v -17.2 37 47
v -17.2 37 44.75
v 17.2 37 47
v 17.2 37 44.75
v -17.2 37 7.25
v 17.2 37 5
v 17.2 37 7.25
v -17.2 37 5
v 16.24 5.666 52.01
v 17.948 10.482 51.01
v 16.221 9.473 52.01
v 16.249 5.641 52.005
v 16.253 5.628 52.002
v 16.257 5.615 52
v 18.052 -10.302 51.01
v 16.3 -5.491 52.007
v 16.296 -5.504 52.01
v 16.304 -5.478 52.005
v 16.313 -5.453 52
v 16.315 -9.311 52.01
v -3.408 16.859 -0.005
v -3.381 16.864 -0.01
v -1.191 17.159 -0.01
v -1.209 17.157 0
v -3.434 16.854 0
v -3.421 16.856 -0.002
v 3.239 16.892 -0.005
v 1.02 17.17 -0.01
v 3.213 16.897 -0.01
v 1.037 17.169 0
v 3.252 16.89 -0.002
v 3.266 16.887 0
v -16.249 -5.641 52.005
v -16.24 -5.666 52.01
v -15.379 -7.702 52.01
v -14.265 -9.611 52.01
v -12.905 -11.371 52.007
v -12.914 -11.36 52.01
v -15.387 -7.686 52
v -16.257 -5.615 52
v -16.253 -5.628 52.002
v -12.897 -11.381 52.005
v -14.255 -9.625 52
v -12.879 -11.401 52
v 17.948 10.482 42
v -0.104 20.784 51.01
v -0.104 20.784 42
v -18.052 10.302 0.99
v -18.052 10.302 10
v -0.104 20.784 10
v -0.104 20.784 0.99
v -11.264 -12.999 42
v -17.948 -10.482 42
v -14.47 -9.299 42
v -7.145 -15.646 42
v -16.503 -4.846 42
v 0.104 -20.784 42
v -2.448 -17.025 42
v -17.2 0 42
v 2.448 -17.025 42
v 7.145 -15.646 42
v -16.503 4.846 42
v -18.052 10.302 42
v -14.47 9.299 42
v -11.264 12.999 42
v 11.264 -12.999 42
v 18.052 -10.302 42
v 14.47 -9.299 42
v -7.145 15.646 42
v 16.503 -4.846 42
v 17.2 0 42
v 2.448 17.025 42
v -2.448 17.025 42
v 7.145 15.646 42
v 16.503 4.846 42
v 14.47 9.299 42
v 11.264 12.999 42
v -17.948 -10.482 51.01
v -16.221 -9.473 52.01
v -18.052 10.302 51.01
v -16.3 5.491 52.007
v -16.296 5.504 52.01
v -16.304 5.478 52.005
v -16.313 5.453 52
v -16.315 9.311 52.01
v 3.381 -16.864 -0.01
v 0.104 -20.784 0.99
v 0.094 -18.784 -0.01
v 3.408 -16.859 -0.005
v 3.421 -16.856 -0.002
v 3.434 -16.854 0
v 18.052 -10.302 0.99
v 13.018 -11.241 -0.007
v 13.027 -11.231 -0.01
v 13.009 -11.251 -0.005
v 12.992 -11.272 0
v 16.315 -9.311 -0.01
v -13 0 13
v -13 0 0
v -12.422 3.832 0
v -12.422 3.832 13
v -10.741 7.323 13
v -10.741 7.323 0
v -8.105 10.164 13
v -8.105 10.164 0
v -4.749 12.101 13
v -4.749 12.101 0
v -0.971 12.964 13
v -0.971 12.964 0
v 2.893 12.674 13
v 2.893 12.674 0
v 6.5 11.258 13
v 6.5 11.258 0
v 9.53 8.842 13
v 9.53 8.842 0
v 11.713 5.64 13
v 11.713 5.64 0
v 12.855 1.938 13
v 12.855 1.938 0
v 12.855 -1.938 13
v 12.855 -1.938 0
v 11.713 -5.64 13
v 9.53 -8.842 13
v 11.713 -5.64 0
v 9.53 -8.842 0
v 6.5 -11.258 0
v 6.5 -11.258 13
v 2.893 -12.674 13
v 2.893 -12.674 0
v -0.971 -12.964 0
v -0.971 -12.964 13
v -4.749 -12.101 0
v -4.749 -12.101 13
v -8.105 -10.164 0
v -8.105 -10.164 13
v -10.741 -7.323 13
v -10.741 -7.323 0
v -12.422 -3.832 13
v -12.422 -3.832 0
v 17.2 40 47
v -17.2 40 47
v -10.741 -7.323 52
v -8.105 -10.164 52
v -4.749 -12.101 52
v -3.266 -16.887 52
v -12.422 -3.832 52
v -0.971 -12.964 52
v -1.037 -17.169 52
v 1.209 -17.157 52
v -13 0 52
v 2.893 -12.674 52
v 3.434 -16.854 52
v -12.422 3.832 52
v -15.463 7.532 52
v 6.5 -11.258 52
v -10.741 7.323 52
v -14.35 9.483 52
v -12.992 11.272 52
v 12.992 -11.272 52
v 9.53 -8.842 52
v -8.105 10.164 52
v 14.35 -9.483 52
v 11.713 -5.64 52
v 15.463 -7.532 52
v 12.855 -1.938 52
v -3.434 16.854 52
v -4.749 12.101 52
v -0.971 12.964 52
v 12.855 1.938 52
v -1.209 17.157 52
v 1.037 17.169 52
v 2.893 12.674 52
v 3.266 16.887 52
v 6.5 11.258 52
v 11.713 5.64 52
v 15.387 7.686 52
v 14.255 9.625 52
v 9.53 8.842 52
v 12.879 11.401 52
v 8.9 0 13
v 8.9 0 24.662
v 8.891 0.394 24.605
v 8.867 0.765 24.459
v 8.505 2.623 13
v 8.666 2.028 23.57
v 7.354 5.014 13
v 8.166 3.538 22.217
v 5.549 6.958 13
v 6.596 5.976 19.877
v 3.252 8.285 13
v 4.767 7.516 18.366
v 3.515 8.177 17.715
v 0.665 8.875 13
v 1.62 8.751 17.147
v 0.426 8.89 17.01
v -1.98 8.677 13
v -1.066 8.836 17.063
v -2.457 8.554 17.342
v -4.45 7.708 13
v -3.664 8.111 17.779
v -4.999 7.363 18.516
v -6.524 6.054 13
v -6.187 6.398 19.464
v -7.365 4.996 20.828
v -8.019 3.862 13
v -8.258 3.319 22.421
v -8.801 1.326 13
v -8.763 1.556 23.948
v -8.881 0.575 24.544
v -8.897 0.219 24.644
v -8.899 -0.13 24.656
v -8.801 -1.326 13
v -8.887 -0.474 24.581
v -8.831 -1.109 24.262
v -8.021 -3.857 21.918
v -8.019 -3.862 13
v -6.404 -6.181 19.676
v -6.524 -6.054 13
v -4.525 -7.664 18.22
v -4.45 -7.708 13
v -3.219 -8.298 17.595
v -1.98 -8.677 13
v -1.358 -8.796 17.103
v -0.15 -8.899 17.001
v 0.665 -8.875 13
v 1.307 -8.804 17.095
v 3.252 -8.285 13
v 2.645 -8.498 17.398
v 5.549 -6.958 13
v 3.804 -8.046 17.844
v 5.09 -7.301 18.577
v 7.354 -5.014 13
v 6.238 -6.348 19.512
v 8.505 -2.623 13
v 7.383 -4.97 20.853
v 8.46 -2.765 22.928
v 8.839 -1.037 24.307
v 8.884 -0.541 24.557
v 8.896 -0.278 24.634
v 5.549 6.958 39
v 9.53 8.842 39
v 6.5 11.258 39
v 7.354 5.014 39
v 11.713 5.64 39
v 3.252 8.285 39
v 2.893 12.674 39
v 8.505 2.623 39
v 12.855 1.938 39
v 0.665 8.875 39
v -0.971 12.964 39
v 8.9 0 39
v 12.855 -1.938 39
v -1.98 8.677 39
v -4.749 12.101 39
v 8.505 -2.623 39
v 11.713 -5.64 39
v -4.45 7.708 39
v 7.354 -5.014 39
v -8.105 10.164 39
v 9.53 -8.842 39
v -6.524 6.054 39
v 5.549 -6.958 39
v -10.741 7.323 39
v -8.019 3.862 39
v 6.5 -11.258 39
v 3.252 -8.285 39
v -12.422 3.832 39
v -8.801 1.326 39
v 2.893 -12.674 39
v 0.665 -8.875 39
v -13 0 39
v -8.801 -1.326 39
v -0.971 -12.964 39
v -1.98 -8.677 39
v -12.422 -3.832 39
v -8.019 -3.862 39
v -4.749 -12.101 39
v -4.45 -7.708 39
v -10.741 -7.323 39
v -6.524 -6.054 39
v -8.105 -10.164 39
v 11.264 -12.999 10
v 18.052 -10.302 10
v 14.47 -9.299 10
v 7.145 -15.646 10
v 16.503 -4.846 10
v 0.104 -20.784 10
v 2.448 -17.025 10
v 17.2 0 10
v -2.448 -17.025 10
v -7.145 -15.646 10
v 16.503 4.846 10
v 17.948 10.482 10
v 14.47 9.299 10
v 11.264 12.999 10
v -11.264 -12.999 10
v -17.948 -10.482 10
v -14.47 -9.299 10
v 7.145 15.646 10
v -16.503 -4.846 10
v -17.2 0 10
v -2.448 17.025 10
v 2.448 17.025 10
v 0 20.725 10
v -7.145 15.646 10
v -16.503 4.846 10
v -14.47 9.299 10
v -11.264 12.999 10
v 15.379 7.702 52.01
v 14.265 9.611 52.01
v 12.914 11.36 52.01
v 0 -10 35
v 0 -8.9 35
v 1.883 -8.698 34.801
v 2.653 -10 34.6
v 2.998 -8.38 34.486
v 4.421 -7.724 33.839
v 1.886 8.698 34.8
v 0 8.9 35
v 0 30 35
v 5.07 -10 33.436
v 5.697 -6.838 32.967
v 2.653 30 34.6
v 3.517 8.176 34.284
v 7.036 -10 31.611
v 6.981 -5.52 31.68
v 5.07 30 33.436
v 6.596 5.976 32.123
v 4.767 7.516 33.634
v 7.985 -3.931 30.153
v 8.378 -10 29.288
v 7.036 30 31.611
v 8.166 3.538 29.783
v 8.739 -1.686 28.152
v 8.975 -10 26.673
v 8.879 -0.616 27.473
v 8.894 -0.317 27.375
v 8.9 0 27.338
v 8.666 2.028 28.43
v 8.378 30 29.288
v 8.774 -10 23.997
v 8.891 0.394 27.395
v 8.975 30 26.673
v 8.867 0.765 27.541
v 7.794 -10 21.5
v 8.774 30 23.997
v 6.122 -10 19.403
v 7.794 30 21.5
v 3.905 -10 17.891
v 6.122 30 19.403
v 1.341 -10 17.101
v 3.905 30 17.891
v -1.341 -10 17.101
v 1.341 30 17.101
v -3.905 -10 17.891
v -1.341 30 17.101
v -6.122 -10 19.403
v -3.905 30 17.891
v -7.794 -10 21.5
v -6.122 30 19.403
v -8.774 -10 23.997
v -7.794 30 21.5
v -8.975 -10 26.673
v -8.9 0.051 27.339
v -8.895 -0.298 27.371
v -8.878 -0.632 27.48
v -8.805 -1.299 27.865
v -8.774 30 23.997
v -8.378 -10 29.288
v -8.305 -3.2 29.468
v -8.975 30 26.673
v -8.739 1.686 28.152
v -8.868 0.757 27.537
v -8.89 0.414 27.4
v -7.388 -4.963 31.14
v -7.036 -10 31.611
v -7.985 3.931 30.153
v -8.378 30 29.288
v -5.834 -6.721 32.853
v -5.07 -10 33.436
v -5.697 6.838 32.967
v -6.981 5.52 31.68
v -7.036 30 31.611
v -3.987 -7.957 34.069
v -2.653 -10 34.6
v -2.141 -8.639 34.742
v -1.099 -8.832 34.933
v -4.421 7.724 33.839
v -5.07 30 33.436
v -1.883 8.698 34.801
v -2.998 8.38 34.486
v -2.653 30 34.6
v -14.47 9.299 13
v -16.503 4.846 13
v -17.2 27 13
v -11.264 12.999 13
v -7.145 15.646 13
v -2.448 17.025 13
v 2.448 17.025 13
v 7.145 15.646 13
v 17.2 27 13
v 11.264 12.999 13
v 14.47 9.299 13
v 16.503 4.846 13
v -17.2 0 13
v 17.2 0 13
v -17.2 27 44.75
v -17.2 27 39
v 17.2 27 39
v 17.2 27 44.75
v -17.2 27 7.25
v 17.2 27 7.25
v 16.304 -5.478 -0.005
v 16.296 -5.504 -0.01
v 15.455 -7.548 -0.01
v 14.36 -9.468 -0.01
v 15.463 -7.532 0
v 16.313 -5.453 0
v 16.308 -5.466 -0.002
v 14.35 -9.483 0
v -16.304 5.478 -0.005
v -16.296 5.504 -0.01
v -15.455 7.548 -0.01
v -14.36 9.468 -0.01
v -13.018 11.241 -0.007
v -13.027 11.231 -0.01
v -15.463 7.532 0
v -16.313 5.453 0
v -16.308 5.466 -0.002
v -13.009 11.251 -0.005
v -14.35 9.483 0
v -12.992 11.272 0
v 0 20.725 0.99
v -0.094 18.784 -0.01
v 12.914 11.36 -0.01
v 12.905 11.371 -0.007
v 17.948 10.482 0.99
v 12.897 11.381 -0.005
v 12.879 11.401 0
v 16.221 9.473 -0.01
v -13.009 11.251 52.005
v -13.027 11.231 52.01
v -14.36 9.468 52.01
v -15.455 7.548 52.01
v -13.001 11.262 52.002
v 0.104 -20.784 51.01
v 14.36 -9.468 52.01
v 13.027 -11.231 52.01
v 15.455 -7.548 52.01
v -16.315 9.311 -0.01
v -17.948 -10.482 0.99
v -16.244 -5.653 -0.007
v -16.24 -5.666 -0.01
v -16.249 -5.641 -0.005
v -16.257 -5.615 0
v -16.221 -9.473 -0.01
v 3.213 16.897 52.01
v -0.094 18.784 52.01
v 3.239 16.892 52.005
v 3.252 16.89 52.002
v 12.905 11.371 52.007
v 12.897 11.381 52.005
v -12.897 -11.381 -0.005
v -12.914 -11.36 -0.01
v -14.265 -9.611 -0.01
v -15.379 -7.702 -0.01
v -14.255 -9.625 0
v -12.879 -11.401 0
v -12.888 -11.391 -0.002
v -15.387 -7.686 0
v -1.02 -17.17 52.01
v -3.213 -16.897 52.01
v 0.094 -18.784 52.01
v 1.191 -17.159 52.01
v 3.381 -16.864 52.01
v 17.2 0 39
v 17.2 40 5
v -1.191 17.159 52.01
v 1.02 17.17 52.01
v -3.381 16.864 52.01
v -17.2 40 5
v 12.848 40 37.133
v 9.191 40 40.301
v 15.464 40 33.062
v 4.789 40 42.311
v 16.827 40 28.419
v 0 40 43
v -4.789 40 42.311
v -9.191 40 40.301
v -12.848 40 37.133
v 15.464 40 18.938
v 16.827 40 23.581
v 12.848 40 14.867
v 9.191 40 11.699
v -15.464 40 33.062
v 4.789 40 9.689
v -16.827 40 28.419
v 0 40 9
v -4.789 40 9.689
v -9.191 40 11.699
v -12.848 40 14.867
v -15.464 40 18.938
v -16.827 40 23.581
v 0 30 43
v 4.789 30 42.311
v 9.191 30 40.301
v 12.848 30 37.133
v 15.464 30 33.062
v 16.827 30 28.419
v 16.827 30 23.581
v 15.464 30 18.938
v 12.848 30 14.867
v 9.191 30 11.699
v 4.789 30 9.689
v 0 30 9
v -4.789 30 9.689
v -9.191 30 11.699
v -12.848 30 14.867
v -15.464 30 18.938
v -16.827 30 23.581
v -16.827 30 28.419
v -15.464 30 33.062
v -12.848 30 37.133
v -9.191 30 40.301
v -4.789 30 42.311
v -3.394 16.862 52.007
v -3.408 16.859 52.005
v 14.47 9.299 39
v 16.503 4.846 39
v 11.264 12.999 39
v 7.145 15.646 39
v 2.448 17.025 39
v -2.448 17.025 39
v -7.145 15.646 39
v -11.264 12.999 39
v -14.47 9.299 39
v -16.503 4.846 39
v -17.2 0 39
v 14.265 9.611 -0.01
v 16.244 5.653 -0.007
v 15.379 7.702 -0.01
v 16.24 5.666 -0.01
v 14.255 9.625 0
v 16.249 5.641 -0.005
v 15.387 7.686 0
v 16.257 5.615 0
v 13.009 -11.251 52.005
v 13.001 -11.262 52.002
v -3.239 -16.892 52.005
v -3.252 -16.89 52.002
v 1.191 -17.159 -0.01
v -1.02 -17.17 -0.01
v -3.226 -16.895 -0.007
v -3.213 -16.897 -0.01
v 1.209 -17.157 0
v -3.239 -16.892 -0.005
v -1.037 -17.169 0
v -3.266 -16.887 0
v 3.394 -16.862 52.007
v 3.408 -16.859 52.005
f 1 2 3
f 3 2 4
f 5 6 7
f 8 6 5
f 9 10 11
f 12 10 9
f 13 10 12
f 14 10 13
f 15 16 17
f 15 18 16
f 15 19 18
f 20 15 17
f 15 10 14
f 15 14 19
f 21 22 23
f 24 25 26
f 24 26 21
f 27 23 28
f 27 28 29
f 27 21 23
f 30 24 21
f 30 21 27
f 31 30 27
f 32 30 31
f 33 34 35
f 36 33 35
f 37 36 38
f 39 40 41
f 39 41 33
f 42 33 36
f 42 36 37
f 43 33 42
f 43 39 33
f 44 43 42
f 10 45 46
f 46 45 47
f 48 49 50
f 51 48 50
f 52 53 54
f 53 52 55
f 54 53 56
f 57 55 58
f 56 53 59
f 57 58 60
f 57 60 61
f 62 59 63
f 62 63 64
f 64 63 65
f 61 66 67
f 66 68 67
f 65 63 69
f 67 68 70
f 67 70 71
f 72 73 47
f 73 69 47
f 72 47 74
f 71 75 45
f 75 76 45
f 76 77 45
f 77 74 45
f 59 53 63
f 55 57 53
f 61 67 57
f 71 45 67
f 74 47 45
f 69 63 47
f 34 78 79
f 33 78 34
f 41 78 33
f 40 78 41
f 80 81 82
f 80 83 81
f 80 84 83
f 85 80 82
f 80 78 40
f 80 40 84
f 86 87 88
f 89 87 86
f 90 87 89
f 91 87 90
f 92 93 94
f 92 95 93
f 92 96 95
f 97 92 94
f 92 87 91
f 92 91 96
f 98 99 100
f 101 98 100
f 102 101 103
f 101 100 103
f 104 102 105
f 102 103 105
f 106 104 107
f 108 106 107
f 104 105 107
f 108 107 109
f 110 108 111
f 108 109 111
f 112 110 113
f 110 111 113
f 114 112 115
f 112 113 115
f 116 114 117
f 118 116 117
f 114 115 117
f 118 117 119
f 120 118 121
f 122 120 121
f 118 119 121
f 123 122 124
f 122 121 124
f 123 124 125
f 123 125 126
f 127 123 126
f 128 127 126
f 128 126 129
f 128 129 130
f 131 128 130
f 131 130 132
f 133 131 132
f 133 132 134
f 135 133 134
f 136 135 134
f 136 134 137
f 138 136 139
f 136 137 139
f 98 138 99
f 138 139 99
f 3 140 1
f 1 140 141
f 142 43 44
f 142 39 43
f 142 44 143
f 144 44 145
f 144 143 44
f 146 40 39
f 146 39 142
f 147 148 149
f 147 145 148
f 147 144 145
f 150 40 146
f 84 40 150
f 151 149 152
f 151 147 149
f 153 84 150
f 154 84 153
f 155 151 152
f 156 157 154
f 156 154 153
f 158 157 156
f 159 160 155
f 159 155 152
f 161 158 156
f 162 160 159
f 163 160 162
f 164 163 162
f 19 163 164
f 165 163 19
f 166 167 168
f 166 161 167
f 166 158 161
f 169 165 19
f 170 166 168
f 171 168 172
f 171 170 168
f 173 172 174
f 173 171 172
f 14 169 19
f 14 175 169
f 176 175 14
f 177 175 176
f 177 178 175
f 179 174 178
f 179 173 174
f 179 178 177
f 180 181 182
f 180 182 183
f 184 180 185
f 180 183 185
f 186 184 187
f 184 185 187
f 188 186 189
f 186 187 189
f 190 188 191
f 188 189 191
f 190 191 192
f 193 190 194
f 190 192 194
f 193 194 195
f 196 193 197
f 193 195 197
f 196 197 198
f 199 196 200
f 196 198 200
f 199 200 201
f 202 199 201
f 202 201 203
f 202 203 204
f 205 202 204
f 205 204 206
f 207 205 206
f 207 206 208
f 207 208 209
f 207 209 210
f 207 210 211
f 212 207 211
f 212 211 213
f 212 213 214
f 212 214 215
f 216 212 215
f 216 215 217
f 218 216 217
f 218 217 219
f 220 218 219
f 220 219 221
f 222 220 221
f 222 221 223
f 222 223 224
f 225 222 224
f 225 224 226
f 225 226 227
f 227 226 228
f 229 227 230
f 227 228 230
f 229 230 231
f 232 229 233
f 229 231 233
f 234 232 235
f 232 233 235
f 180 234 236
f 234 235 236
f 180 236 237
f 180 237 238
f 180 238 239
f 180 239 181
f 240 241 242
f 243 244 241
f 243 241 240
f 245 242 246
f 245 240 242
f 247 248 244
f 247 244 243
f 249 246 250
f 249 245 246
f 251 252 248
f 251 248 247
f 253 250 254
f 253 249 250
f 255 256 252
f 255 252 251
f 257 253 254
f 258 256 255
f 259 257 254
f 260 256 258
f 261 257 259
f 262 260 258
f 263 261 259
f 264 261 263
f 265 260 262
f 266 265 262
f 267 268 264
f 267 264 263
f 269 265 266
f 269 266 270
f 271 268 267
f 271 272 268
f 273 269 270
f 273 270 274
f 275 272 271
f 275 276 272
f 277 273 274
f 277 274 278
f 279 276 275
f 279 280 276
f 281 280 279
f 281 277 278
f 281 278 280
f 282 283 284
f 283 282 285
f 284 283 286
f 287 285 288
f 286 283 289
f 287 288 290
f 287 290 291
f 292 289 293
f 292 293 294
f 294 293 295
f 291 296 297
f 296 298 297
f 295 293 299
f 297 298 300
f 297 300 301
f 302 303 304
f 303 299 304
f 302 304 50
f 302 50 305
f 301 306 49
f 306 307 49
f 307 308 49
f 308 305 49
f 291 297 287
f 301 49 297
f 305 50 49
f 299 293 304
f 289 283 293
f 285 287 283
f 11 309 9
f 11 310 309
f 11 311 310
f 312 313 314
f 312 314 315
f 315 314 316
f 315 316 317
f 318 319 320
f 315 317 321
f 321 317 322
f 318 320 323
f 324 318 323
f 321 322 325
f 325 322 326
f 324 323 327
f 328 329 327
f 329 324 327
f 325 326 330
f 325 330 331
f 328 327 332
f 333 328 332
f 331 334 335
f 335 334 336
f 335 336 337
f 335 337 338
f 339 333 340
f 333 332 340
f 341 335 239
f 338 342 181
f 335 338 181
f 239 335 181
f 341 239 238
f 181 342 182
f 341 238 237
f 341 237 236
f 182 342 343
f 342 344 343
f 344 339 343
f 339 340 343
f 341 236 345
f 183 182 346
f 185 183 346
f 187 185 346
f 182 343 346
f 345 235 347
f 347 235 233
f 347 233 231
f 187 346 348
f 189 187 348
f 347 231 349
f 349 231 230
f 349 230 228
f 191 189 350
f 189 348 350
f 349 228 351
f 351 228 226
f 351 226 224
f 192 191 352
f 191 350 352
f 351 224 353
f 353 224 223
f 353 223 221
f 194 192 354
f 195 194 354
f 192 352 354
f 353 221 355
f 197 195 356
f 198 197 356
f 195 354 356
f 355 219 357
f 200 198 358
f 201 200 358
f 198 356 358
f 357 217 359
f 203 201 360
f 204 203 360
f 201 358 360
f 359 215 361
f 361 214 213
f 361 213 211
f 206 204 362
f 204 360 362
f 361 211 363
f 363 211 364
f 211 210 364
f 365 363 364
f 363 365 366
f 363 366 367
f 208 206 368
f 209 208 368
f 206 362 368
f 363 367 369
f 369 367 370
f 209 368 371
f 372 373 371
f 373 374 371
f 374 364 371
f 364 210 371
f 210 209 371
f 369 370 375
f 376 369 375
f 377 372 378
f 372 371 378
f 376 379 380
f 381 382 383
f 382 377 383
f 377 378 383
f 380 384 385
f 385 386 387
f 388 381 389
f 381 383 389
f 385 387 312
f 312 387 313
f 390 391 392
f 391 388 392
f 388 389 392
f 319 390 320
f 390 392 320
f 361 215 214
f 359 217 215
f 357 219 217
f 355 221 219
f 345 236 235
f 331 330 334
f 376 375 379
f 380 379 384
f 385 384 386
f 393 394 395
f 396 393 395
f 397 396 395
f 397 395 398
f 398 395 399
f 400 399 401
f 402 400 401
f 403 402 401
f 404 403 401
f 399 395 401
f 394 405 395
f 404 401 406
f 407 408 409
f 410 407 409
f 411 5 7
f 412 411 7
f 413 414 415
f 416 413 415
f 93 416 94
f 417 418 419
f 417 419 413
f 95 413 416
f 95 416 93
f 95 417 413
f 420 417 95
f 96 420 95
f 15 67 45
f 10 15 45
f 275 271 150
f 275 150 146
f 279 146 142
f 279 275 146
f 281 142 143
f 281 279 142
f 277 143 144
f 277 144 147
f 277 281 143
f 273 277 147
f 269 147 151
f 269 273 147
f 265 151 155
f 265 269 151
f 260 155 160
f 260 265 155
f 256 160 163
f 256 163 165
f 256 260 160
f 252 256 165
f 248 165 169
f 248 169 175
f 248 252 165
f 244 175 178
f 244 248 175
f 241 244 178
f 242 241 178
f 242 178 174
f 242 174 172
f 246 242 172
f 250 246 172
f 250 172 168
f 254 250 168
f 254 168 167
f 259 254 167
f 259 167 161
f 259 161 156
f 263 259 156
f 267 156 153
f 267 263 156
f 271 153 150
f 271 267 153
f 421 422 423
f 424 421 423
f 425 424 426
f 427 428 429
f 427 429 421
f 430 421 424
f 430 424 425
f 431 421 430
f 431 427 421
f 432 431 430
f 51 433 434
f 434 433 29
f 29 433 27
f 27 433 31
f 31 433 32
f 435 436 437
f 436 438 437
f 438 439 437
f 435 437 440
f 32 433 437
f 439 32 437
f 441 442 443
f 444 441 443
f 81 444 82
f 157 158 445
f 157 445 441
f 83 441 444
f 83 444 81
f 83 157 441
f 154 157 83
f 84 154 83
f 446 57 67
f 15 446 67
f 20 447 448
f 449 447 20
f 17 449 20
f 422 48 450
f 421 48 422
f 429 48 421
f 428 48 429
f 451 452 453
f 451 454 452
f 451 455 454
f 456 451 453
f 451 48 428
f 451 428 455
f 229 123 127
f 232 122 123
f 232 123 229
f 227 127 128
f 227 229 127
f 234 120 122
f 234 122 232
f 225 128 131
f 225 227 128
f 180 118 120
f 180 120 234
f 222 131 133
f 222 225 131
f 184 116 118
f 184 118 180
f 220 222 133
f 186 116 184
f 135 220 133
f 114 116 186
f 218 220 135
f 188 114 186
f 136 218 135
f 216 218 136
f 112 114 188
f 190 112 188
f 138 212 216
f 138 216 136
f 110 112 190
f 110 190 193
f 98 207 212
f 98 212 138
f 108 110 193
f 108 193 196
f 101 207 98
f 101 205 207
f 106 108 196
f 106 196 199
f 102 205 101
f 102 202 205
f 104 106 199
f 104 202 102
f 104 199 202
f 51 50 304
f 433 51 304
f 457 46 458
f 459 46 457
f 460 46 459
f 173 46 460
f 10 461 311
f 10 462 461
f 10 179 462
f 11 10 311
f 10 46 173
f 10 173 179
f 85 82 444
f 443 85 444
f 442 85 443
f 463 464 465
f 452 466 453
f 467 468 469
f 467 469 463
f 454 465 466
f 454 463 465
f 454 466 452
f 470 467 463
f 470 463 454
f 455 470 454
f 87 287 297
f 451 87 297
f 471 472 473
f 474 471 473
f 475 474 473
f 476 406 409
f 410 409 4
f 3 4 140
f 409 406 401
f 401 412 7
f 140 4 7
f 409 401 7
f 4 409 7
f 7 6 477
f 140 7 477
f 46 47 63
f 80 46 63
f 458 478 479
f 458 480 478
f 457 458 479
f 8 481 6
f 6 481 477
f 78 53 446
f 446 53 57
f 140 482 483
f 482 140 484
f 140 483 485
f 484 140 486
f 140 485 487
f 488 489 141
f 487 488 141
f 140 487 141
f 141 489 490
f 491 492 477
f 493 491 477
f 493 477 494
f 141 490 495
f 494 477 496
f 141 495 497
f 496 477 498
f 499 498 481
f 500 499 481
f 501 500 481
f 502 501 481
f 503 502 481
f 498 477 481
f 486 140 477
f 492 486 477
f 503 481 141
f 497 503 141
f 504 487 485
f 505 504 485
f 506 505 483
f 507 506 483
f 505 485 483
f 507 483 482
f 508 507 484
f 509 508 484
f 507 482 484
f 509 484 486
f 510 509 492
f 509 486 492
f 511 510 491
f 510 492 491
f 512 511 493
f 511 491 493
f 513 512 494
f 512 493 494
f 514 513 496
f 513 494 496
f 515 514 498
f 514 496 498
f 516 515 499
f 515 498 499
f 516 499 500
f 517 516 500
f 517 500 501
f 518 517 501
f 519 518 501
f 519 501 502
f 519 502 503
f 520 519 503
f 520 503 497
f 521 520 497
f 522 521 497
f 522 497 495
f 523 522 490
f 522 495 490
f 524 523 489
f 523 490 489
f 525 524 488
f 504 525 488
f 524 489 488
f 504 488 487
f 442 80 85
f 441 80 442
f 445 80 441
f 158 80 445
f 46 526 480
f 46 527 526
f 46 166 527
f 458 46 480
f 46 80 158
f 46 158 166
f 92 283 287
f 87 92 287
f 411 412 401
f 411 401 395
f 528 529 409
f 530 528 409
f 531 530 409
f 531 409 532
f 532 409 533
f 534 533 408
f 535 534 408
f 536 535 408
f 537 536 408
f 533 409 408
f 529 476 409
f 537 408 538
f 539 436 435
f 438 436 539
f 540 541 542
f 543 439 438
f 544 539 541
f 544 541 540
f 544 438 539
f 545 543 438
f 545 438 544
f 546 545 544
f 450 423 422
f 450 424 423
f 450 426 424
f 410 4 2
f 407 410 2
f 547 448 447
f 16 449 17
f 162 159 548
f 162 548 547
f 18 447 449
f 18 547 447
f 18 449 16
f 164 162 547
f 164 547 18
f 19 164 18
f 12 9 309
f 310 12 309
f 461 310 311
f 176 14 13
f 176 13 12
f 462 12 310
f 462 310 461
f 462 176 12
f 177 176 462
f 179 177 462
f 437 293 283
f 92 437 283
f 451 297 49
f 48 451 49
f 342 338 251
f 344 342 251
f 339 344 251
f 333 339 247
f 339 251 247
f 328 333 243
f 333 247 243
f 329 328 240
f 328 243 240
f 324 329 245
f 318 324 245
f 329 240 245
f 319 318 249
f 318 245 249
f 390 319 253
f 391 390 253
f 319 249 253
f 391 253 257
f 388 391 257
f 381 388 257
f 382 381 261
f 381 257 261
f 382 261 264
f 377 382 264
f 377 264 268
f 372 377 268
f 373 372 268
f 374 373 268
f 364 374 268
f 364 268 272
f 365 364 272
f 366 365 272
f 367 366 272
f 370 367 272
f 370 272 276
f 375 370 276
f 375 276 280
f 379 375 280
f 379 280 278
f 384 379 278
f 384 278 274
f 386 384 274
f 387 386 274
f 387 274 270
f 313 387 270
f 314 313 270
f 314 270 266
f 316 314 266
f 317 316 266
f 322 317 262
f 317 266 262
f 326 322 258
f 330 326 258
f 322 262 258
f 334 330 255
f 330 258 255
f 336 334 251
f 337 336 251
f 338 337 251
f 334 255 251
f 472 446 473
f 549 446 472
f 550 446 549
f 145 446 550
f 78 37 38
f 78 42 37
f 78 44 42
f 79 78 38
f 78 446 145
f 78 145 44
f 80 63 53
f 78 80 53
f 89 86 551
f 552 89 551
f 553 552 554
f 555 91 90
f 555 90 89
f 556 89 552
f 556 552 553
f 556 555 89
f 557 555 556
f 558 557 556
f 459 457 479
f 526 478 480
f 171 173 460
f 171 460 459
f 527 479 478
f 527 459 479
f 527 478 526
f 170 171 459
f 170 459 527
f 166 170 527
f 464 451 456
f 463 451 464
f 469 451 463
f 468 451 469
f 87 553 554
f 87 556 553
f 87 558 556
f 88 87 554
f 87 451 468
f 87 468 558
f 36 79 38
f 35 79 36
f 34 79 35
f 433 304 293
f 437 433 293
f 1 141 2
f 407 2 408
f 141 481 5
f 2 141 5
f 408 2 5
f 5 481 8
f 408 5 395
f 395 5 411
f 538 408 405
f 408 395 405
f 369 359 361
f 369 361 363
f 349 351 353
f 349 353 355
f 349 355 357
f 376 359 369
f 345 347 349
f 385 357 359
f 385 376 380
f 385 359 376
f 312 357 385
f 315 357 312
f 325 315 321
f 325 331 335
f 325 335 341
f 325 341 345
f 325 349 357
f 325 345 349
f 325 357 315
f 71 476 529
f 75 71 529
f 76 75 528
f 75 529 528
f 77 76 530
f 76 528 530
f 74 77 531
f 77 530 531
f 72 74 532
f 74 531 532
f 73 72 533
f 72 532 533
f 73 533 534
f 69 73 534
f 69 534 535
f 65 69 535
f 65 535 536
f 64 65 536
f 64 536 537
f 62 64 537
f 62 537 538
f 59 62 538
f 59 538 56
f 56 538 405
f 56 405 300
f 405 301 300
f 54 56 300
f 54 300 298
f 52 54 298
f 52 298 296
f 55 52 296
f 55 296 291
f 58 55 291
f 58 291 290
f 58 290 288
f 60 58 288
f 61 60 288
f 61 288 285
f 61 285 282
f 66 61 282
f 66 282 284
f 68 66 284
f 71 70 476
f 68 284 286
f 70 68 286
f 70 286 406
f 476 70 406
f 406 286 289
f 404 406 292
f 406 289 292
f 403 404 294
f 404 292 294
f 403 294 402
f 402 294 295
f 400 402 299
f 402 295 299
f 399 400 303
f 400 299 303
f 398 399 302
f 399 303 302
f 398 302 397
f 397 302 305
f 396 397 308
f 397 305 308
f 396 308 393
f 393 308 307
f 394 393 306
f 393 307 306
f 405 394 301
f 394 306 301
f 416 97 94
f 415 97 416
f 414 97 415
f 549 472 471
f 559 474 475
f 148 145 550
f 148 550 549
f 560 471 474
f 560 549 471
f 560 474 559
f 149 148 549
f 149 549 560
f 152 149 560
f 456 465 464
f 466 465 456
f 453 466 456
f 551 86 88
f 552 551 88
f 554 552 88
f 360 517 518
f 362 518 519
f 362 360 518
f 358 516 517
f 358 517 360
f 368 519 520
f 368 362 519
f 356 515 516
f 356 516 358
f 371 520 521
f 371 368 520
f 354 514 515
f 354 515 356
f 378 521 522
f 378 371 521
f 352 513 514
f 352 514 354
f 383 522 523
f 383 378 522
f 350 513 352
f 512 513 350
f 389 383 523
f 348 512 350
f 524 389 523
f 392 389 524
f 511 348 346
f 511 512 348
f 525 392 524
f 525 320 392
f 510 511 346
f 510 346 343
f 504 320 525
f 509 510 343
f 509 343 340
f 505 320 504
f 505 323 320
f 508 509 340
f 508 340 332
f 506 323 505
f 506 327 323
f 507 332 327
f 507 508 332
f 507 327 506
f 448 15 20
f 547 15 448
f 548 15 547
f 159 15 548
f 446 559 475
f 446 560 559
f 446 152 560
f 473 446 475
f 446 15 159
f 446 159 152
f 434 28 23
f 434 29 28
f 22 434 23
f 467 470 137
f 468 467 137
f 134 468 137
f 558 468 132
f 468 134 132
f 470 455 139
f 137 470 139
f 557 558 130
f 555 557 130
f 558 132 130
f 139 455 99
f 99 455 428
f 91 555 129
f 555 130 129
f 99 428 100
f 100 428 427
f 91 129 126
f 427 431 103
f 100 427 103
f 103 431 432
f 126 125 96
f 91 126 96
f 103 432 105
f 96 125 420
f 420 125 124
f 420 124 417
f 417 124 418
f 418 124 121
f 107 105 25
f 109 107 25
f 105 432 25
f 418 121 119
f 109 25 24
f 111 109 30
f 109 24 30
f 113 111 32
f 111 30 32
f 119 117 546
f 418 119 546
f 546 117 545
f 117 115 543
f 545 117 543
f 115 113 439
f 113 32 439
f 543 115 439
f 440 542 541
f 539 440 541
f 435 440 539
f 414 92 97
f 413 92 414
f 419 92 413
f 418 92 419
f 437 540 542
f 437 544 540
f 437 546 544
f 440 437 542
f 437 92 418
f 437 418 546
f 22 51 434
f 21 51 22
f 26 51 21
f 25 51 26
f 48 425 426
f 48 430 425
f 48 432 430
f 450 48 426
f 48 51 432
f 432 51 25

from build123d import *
from build123d.topology import SkipClean

# Parameters (mm, degrees)
SKETCH2_R                = 17.199960221
SKETCH2_R_2              = 12.422193493
SKETCH2_R_3              = 8.504424776
BOSS_EXTRUDE2_DEPTH      = 52
SKETCH4_R                = 13
CUT_EXTRUDE1_DEPTH       = 13
CUT_EXTRUDE2_START       = -13
SKETCH5_R                = 13
CUT_EXTRUDE2_DEPTH       = 13
SKETCH6_R                = 8.9
CUT_EXTRUDE3_DEPTH       = 59.45373069
CUT_EXTRUDE4_DEPTH       = 5
CUT_EXTRUDE5_START       = -5
CUT_EXTRUDE5_DEPTH       = 5
CUT_EXTRUDE6_START       = -2.25
CUT_EXTRUDE6_DEPTH       = 2.25
CUT_EXTRUDE7_DEPTH       = 2.25
CUT_EXTRUDE9_START       = -5.75
CUT_EXTRUDE9_DEPTH       = 5.75
CUT_EXTRUDE10_DEPTH      = 5.75
BOSS_EXTRUDE3_DEPTH      = 0.01
BOSS_EXTRUDE3_DEPTH_BACK = 10
SKETCH13_R               = 17.199960221
BOSS_EXTRUDE4_DEPTH      = 0.01
BOSS_EXTRUDE4_DEPTH_BACK = 10
SKETCH15_R               = 17.199960221
SKETCH16_R               = 17
CUT_EXTRUDE11_DEPTH      = 10
SKETCH17_R               = 9
CUT_EXTRUDE12_DEPTH      = 40
CHAMFER3_SIZE            = 1
CHAMFER3_SIZE_2          = 1.732050808


with BuildPart() as part:
    # Sketch2 → Boss-Extrude2 (new body)
    # profile 1 of 3: a face of its own
    with BuildSketch(Plane.XY):
        with BuildLine():
            Line((17.199960221, 40), (-17.199960221, 40))
            Line((-17.199960221, 40), (-17.199960221, 0))
            ThreePointArc((-17.199960221, 0), (0, 17.199960221), (17.199960221, 0))
            Line((17.199960221, 0), (17.199960221, 40))
        make_face()
    # profile 2 of 3: a face of its own
    with BuildSketch(Plane.XY):
        Circle(SKETCH2_R)
        Circle(SKETCH2_R_2, mode=Mode.SUBTRACT)
    # profile 3 of 3: a face of its own
    with BuildSketch(Plane.XY):
        Circle(SKETCH2_R_2)
        with Locations(Location((0, 0, 0), (0, 0, 180))):
            Circle(SKETCH2_R_3, mode=Mode.SUBTRACT)
    extrude(amount=BOSS_EXTRUDE2_DEPTH)

    # Sketch4 → Cut-Extrude1 (cut)
    with BuildSketch(Plane(origin=(0, 0, 0), x_dir=(-1, 0, 0), z_dir=(0, 0, -1))):
        Circle(SKETCH4_R)
    extrude(amount=-CUT_EXTRUDE1_DEPTH, mode=Mode.SUBTRACT)

    # Sketch5 → Cut-Extrude2 (cut)
    with BuildSketch(Plane.XY.offset(52).offset(CUT_EXTRUDE2_START)):
        with Locations(Location((0, 0, 0), (0, 0, 180))):
            Circle(SKETCH5_R)
    extrude(amount=CUT_EXTRUDE2_DEPTH, mode=Mode.SUBTRACT)

    # Sketch6 → Cut-Extrude3 (cut, through all)
    with BuildSketch(Plane.XY.offset(39)):
        Circle(SKETCH6_R)
    extrude(amount=-CUT_EXTRUDE3_DEPTH, mode=Mode.SUBTRACT)

    # Sketch7 → Cut-Extrude4 (cut)
    with BuildSketch(Plane(origin=(0, 0, 0), x_dir=(-1, 0, 0), z_dir=(0, 0, -1))):
        with BuildLine():
            Line((-17.199960221, 0), (-17.199960221, 40))
            Line((-17.199960221, 40), (17.199960221, 40))
            Line((17.199960221, 40), (17.199960221, 0))
            ThreePointArc((17.199960221, 0), (0, 17.199960221), (-17.199960221, 0))
        make_face()
    extrude(amount=-CUT_EXTRUDE4_DEPTH, mode=Mode.SUBTRACT)

    # Sketch8 → Cut-Extrude5 (cut)
    with BuildSketch(Plane.XY.offset(52).offset(CUT_EXTRUDE5_START)):
        with BuildLine():
            Line((-17.199960221, 0), (-17.199960221, 40))
            Line((-17.199960221, 40), (17.199960221, 40))
            Line((17.199960221, 40), (17.199960221, 0))
            ThreePointArc((17.199960221, 0), (0, 17.199960221), (-17.199960221, 0))
        make_face()
    extrude(amount=CUT_EXTRUDE5_DEPTH, mode=Mode.SUBTRACT)

    # Sketch9 → Cut-Extrude6 (cut)
    with BuildSketch(Plane.XY.offset(47).offset(CUT_EXTRUDE6_START)):
        with BuildLine():
            Line((-17.199960221, 37), (17.199960221, 37))
            Line((17.199960221, 37), (17.199960221, 0))
            ThreePointArc((17.199960221, 0), (0, 17.199960221), (-17.199960221, 0))
            Line((-17.199960221, 0), (-17.199960221, 37))
        make_face()
    extrude(amount=CUT_EXTRUDE6_DEPTH, mode=Mode.SUBTRACT)

    # Sketch10 → Cut-Extrude7 (cut)
    with SkipClean():  # the faces are left unmerged after this step: merging them gives an invalid solid
        with BuildSketch(Plane(origin=(0, 0, 5), x_dir=(-1, 0, 0), z_dir=(0, 0, -1))):
            with BuildLine():
                Line((-17.199960221, 37), (17.199960221, 37))
                Line((17.199960221, 37), (17.199960221, 0))
                ThreePointArc((17.199960221, 0), (0, 17.199960221), (-17.199960221, 0))
                Line((-17.199960221, 0), (-17.199960221, 37))
            make_face()
        extrude(amount=-CUT_EXTRUDE7_DEPTH, mode=Mode.SUBTRACT)
    add(part.part.scale(1), mode=Mode.REPLACE)  # the faces are merged on a copy

    # Sketch11 → Cut-Extrude9 (cut)
    with BuildSketch(Plane.XY.offset(44.75).offset(CUT_EXTRUDE9_START)):
        with BuildLine():
            Line((-17.199960221, 27), (17.199960221, 27))
            Line((17.199960221, 27), (17.199960221, 0))
            ThreePointArc((17.199960221, 0), (0, 17.199960221), (-17.199960221, 0))
            Line((-17.199960221, 0), (-17.199960221, 27))
        make_face()
    extrude(amount=CUT_EXTRUDE9_DEPTH, mode=Mode.SUBTRACT)

    # Sketch12 → Cut-Extrude10 (cut)
    with BuildSketch(Plane(origin=(0, 0, 7.25), x_dir=(-1, 0, 0), z_dir=(0, 0, -1))):
        with BuildLine():
            Line((-17.199960221, 27), (17.199960221, 27))
            Line((17.199960221, 27), (17.199960221, 0))
            ThreePointArc((17.199960221, 0), (0, 17.199960221), (-17.199960221, 0))
            Line((-17.199960221, 0), (-17.199960221, 27))
        make_face()
    extrude(amount=-CUT_EXTRUDE10_DEPTH, mode=Mode.SUBTRACT)

    # Sketch13 → Boss-Extrude3 (add, two sides: drawn at the far end of the back side and taken through both)
    with BuildSketch(Plane(origin=(0, 0, 0), x_dir=(-1, 0, 0), z_dir=(0, 0, -1)).offset(-BOSS_EXTRUDE3_DEPTH_BACK)):
        Polygon((-0.103617408, -20.784351408), (17.947967616, -10.481911012), (18.051585024, 10.302440396), (0.103617408, 20.784351408), (0, 20.725214652), (-17.947967616, 10.481911012), (-18.051585024, -10.302440396), align=None)
        Circle(SKETCH13_R, mode=Mode.SUBTRACT)
    extrude(amount=BOSS_EXTRUDE3_DEPTH + BOSS_EXTRUDE3_DEPTH_BACK)

    # Sketch15 → Boss-Extrude4 (add, two sides: drawn at the far end of the back side and taken through both)
    with BuildSketch(Plane.XY.offset(52).offset(-BOSS_EXTRUDE4_DEPTH_BACK)):
        Polygon((-18.051585024, 10.302440396), (-17.947967616, -10.481911012), (0.103617408, -20.784351408), (18.051585024, -10.302440396), (17.947967616, 10.481911012), (-0.103617408, 20.784351408), align=None)
        with Locations(Location((0, 0, 0), (0, 0, 180))):
            Circle(SKETCH15_R, mode=Mode.SUBTRACT)
    extrude(amount=BOSS_EXTRUDE4_DEPTH + BOSS_EXTRUDE4_DEPTH_BACK)

    # Sketch16 → Cut-Extrude11 (cut)
    with BuildSketch(Plane(origin=(0, 40, 0), x_dir=(1, 0, 0), z_dir=(0, 1, 0))):
        with Locations(Location((0, -26, 0), (0, 0, 270))):
            Circle(SKETCH16_R)
    extrude(amount=-CUT_EXTRUDE11_DEPTH, mode=Mode.SUBTRACT)

    # Sketch17 → Cut-Extrude12 (cut)
    with BuildSketch(Plane(origin=(0, 30, 0), x_dir=(1, 0, 0), z_dir=(0, 1, 0))):
        with Locations(Location((0, -26, 0), (0, 0, 270))):
            Circle(SKETCH17_R)
    extrude(amount=-CUT_EXTRUDE12_DEPTH, mode=Mode.SUBTRACT)

    # Chamfer3
    # the kernel refuses this chamfer: 1.732050808, 1 mm, written as the material it takes off along each edge
    with BuildSketch(Plane(origin=(21.92099597, -8.042640174, -0.01), x_dir=(0.029196521986656933, -0.04999262353370063, 0.9983227437537924), z_dir=(-0.8635219945420718, -0.5043111786804675, 0)), Plane(origin=(3.99536728, -23.005459473, -0.01), x_dir=(-0.028696620988686708, -0.050281241509443776, 0.9983227437537926), z_dir=(-0.8685072894207939, 0.4956763946598076, 0)), Plane(origin=(-17.925628689, -14.962819299, -0.01), x_dir=(-0.05789314297534289, -0.0002886179757454726, 0.9983227437537926), z_dir=(-0.004985294878722003, 0.9999875733402752, 0)), Plane(origin=(-21.92099597, 8.042640174, -0.01), x_dir=(-0.029196521986655326, 0.04999262353369786, 0.9983227437537926), z_dir=(0.8635219945420716, 0.5043111786804677, 0)), Plane(origin=(17.925628689, 14.962819299, -0.01), x_dir=(0.05789314297534289, 0.0002886179757454726, 0.9983227437537926), z_dir=(0.004985294878722003, -0.9999875733402752, 0)), Plane(origin=(-18.073923951, 14.783348683, 52.01), x_dir=(-0.05789314297534298, -0.00028861797574591844, -0.9983227437537926), z_dir=(0.004985294878729695, -0.9999875733402751, 0)), Plane(origin=(-21.839717488, -8.260802946, 52.01), x_dir=(-0.028696620988686607, -0.05028124150944443, -0.9983227437537926), z_dir=(0.8685072894207975, -0.49567639465980146, 0)), Plane(origin=(-3.765793537, -23.044151629, 52.01), x_dir=(0.02919652198665585, -0.04999262353369789, -0.9983227437537927), z_dir=(0.8635219945420678, 0.5043111786804741, 0)), Plane(origin=(18.073923951, -14.783348683, 52.01), x_dir=(0.057893142975342975, 0.00028861797574592825, -0.9983227437537926), z_dir=(-0.004985294878729864, 0.9999875733402751, 0)), Plane(origin=(21.839717488, 8.260802946, 52.01), x_dir=(0.02869662098868756, 0.050281241509446094, -0.9983227437537926), z_dir=(-0.8685072894207974, 0.4956763946598015, 0)), Plane(origin=(3.765793537, 23.044151629, 52.01), x_dir=(-0.029196521986655923, 0.04999262353369809, -0.9983227437537926), z_dir=(-0.8635219945420681, -0.5043111786804736, 0))) as chamfer3_piece_1:
        Polygon((CHAMFER3_SIZE * 0.998322743754, CHAMFER3_SIZE * 0.0578938624027), (-CHAMFER3_SIZE_2 * 0.0578938623883, CHAMFER3_SIZE_2 * 0.998322743505), (0, 0), align=None)
    extrude(amount=29.746537632, mode=Mode.SUBTRACT)
    with BuildSketch(Plane(origin=(21.839717488, 8.260802946, -0.01), x_dir=(0.02869662098868796, 0.05028124150944598, 0.9983227437537924), z_dir=(-0.8685072894207939, 0.4956763946598075, 0))) as chamfer3_piece_2:
        Polygon((CHAMFER3_SIZE * 0.998322743754, -CHAMFER3_SIZE * 0.0578938624027), (-CHAMFER3_SIZE_2 * 0.0578938623883, -CHAMFER3_SIZE_2 * 0.998322743505), (0, 0), align=None)
    extrude(amount=29.746537632, mode=Mode.SUBTRACT)


solid = part.part
